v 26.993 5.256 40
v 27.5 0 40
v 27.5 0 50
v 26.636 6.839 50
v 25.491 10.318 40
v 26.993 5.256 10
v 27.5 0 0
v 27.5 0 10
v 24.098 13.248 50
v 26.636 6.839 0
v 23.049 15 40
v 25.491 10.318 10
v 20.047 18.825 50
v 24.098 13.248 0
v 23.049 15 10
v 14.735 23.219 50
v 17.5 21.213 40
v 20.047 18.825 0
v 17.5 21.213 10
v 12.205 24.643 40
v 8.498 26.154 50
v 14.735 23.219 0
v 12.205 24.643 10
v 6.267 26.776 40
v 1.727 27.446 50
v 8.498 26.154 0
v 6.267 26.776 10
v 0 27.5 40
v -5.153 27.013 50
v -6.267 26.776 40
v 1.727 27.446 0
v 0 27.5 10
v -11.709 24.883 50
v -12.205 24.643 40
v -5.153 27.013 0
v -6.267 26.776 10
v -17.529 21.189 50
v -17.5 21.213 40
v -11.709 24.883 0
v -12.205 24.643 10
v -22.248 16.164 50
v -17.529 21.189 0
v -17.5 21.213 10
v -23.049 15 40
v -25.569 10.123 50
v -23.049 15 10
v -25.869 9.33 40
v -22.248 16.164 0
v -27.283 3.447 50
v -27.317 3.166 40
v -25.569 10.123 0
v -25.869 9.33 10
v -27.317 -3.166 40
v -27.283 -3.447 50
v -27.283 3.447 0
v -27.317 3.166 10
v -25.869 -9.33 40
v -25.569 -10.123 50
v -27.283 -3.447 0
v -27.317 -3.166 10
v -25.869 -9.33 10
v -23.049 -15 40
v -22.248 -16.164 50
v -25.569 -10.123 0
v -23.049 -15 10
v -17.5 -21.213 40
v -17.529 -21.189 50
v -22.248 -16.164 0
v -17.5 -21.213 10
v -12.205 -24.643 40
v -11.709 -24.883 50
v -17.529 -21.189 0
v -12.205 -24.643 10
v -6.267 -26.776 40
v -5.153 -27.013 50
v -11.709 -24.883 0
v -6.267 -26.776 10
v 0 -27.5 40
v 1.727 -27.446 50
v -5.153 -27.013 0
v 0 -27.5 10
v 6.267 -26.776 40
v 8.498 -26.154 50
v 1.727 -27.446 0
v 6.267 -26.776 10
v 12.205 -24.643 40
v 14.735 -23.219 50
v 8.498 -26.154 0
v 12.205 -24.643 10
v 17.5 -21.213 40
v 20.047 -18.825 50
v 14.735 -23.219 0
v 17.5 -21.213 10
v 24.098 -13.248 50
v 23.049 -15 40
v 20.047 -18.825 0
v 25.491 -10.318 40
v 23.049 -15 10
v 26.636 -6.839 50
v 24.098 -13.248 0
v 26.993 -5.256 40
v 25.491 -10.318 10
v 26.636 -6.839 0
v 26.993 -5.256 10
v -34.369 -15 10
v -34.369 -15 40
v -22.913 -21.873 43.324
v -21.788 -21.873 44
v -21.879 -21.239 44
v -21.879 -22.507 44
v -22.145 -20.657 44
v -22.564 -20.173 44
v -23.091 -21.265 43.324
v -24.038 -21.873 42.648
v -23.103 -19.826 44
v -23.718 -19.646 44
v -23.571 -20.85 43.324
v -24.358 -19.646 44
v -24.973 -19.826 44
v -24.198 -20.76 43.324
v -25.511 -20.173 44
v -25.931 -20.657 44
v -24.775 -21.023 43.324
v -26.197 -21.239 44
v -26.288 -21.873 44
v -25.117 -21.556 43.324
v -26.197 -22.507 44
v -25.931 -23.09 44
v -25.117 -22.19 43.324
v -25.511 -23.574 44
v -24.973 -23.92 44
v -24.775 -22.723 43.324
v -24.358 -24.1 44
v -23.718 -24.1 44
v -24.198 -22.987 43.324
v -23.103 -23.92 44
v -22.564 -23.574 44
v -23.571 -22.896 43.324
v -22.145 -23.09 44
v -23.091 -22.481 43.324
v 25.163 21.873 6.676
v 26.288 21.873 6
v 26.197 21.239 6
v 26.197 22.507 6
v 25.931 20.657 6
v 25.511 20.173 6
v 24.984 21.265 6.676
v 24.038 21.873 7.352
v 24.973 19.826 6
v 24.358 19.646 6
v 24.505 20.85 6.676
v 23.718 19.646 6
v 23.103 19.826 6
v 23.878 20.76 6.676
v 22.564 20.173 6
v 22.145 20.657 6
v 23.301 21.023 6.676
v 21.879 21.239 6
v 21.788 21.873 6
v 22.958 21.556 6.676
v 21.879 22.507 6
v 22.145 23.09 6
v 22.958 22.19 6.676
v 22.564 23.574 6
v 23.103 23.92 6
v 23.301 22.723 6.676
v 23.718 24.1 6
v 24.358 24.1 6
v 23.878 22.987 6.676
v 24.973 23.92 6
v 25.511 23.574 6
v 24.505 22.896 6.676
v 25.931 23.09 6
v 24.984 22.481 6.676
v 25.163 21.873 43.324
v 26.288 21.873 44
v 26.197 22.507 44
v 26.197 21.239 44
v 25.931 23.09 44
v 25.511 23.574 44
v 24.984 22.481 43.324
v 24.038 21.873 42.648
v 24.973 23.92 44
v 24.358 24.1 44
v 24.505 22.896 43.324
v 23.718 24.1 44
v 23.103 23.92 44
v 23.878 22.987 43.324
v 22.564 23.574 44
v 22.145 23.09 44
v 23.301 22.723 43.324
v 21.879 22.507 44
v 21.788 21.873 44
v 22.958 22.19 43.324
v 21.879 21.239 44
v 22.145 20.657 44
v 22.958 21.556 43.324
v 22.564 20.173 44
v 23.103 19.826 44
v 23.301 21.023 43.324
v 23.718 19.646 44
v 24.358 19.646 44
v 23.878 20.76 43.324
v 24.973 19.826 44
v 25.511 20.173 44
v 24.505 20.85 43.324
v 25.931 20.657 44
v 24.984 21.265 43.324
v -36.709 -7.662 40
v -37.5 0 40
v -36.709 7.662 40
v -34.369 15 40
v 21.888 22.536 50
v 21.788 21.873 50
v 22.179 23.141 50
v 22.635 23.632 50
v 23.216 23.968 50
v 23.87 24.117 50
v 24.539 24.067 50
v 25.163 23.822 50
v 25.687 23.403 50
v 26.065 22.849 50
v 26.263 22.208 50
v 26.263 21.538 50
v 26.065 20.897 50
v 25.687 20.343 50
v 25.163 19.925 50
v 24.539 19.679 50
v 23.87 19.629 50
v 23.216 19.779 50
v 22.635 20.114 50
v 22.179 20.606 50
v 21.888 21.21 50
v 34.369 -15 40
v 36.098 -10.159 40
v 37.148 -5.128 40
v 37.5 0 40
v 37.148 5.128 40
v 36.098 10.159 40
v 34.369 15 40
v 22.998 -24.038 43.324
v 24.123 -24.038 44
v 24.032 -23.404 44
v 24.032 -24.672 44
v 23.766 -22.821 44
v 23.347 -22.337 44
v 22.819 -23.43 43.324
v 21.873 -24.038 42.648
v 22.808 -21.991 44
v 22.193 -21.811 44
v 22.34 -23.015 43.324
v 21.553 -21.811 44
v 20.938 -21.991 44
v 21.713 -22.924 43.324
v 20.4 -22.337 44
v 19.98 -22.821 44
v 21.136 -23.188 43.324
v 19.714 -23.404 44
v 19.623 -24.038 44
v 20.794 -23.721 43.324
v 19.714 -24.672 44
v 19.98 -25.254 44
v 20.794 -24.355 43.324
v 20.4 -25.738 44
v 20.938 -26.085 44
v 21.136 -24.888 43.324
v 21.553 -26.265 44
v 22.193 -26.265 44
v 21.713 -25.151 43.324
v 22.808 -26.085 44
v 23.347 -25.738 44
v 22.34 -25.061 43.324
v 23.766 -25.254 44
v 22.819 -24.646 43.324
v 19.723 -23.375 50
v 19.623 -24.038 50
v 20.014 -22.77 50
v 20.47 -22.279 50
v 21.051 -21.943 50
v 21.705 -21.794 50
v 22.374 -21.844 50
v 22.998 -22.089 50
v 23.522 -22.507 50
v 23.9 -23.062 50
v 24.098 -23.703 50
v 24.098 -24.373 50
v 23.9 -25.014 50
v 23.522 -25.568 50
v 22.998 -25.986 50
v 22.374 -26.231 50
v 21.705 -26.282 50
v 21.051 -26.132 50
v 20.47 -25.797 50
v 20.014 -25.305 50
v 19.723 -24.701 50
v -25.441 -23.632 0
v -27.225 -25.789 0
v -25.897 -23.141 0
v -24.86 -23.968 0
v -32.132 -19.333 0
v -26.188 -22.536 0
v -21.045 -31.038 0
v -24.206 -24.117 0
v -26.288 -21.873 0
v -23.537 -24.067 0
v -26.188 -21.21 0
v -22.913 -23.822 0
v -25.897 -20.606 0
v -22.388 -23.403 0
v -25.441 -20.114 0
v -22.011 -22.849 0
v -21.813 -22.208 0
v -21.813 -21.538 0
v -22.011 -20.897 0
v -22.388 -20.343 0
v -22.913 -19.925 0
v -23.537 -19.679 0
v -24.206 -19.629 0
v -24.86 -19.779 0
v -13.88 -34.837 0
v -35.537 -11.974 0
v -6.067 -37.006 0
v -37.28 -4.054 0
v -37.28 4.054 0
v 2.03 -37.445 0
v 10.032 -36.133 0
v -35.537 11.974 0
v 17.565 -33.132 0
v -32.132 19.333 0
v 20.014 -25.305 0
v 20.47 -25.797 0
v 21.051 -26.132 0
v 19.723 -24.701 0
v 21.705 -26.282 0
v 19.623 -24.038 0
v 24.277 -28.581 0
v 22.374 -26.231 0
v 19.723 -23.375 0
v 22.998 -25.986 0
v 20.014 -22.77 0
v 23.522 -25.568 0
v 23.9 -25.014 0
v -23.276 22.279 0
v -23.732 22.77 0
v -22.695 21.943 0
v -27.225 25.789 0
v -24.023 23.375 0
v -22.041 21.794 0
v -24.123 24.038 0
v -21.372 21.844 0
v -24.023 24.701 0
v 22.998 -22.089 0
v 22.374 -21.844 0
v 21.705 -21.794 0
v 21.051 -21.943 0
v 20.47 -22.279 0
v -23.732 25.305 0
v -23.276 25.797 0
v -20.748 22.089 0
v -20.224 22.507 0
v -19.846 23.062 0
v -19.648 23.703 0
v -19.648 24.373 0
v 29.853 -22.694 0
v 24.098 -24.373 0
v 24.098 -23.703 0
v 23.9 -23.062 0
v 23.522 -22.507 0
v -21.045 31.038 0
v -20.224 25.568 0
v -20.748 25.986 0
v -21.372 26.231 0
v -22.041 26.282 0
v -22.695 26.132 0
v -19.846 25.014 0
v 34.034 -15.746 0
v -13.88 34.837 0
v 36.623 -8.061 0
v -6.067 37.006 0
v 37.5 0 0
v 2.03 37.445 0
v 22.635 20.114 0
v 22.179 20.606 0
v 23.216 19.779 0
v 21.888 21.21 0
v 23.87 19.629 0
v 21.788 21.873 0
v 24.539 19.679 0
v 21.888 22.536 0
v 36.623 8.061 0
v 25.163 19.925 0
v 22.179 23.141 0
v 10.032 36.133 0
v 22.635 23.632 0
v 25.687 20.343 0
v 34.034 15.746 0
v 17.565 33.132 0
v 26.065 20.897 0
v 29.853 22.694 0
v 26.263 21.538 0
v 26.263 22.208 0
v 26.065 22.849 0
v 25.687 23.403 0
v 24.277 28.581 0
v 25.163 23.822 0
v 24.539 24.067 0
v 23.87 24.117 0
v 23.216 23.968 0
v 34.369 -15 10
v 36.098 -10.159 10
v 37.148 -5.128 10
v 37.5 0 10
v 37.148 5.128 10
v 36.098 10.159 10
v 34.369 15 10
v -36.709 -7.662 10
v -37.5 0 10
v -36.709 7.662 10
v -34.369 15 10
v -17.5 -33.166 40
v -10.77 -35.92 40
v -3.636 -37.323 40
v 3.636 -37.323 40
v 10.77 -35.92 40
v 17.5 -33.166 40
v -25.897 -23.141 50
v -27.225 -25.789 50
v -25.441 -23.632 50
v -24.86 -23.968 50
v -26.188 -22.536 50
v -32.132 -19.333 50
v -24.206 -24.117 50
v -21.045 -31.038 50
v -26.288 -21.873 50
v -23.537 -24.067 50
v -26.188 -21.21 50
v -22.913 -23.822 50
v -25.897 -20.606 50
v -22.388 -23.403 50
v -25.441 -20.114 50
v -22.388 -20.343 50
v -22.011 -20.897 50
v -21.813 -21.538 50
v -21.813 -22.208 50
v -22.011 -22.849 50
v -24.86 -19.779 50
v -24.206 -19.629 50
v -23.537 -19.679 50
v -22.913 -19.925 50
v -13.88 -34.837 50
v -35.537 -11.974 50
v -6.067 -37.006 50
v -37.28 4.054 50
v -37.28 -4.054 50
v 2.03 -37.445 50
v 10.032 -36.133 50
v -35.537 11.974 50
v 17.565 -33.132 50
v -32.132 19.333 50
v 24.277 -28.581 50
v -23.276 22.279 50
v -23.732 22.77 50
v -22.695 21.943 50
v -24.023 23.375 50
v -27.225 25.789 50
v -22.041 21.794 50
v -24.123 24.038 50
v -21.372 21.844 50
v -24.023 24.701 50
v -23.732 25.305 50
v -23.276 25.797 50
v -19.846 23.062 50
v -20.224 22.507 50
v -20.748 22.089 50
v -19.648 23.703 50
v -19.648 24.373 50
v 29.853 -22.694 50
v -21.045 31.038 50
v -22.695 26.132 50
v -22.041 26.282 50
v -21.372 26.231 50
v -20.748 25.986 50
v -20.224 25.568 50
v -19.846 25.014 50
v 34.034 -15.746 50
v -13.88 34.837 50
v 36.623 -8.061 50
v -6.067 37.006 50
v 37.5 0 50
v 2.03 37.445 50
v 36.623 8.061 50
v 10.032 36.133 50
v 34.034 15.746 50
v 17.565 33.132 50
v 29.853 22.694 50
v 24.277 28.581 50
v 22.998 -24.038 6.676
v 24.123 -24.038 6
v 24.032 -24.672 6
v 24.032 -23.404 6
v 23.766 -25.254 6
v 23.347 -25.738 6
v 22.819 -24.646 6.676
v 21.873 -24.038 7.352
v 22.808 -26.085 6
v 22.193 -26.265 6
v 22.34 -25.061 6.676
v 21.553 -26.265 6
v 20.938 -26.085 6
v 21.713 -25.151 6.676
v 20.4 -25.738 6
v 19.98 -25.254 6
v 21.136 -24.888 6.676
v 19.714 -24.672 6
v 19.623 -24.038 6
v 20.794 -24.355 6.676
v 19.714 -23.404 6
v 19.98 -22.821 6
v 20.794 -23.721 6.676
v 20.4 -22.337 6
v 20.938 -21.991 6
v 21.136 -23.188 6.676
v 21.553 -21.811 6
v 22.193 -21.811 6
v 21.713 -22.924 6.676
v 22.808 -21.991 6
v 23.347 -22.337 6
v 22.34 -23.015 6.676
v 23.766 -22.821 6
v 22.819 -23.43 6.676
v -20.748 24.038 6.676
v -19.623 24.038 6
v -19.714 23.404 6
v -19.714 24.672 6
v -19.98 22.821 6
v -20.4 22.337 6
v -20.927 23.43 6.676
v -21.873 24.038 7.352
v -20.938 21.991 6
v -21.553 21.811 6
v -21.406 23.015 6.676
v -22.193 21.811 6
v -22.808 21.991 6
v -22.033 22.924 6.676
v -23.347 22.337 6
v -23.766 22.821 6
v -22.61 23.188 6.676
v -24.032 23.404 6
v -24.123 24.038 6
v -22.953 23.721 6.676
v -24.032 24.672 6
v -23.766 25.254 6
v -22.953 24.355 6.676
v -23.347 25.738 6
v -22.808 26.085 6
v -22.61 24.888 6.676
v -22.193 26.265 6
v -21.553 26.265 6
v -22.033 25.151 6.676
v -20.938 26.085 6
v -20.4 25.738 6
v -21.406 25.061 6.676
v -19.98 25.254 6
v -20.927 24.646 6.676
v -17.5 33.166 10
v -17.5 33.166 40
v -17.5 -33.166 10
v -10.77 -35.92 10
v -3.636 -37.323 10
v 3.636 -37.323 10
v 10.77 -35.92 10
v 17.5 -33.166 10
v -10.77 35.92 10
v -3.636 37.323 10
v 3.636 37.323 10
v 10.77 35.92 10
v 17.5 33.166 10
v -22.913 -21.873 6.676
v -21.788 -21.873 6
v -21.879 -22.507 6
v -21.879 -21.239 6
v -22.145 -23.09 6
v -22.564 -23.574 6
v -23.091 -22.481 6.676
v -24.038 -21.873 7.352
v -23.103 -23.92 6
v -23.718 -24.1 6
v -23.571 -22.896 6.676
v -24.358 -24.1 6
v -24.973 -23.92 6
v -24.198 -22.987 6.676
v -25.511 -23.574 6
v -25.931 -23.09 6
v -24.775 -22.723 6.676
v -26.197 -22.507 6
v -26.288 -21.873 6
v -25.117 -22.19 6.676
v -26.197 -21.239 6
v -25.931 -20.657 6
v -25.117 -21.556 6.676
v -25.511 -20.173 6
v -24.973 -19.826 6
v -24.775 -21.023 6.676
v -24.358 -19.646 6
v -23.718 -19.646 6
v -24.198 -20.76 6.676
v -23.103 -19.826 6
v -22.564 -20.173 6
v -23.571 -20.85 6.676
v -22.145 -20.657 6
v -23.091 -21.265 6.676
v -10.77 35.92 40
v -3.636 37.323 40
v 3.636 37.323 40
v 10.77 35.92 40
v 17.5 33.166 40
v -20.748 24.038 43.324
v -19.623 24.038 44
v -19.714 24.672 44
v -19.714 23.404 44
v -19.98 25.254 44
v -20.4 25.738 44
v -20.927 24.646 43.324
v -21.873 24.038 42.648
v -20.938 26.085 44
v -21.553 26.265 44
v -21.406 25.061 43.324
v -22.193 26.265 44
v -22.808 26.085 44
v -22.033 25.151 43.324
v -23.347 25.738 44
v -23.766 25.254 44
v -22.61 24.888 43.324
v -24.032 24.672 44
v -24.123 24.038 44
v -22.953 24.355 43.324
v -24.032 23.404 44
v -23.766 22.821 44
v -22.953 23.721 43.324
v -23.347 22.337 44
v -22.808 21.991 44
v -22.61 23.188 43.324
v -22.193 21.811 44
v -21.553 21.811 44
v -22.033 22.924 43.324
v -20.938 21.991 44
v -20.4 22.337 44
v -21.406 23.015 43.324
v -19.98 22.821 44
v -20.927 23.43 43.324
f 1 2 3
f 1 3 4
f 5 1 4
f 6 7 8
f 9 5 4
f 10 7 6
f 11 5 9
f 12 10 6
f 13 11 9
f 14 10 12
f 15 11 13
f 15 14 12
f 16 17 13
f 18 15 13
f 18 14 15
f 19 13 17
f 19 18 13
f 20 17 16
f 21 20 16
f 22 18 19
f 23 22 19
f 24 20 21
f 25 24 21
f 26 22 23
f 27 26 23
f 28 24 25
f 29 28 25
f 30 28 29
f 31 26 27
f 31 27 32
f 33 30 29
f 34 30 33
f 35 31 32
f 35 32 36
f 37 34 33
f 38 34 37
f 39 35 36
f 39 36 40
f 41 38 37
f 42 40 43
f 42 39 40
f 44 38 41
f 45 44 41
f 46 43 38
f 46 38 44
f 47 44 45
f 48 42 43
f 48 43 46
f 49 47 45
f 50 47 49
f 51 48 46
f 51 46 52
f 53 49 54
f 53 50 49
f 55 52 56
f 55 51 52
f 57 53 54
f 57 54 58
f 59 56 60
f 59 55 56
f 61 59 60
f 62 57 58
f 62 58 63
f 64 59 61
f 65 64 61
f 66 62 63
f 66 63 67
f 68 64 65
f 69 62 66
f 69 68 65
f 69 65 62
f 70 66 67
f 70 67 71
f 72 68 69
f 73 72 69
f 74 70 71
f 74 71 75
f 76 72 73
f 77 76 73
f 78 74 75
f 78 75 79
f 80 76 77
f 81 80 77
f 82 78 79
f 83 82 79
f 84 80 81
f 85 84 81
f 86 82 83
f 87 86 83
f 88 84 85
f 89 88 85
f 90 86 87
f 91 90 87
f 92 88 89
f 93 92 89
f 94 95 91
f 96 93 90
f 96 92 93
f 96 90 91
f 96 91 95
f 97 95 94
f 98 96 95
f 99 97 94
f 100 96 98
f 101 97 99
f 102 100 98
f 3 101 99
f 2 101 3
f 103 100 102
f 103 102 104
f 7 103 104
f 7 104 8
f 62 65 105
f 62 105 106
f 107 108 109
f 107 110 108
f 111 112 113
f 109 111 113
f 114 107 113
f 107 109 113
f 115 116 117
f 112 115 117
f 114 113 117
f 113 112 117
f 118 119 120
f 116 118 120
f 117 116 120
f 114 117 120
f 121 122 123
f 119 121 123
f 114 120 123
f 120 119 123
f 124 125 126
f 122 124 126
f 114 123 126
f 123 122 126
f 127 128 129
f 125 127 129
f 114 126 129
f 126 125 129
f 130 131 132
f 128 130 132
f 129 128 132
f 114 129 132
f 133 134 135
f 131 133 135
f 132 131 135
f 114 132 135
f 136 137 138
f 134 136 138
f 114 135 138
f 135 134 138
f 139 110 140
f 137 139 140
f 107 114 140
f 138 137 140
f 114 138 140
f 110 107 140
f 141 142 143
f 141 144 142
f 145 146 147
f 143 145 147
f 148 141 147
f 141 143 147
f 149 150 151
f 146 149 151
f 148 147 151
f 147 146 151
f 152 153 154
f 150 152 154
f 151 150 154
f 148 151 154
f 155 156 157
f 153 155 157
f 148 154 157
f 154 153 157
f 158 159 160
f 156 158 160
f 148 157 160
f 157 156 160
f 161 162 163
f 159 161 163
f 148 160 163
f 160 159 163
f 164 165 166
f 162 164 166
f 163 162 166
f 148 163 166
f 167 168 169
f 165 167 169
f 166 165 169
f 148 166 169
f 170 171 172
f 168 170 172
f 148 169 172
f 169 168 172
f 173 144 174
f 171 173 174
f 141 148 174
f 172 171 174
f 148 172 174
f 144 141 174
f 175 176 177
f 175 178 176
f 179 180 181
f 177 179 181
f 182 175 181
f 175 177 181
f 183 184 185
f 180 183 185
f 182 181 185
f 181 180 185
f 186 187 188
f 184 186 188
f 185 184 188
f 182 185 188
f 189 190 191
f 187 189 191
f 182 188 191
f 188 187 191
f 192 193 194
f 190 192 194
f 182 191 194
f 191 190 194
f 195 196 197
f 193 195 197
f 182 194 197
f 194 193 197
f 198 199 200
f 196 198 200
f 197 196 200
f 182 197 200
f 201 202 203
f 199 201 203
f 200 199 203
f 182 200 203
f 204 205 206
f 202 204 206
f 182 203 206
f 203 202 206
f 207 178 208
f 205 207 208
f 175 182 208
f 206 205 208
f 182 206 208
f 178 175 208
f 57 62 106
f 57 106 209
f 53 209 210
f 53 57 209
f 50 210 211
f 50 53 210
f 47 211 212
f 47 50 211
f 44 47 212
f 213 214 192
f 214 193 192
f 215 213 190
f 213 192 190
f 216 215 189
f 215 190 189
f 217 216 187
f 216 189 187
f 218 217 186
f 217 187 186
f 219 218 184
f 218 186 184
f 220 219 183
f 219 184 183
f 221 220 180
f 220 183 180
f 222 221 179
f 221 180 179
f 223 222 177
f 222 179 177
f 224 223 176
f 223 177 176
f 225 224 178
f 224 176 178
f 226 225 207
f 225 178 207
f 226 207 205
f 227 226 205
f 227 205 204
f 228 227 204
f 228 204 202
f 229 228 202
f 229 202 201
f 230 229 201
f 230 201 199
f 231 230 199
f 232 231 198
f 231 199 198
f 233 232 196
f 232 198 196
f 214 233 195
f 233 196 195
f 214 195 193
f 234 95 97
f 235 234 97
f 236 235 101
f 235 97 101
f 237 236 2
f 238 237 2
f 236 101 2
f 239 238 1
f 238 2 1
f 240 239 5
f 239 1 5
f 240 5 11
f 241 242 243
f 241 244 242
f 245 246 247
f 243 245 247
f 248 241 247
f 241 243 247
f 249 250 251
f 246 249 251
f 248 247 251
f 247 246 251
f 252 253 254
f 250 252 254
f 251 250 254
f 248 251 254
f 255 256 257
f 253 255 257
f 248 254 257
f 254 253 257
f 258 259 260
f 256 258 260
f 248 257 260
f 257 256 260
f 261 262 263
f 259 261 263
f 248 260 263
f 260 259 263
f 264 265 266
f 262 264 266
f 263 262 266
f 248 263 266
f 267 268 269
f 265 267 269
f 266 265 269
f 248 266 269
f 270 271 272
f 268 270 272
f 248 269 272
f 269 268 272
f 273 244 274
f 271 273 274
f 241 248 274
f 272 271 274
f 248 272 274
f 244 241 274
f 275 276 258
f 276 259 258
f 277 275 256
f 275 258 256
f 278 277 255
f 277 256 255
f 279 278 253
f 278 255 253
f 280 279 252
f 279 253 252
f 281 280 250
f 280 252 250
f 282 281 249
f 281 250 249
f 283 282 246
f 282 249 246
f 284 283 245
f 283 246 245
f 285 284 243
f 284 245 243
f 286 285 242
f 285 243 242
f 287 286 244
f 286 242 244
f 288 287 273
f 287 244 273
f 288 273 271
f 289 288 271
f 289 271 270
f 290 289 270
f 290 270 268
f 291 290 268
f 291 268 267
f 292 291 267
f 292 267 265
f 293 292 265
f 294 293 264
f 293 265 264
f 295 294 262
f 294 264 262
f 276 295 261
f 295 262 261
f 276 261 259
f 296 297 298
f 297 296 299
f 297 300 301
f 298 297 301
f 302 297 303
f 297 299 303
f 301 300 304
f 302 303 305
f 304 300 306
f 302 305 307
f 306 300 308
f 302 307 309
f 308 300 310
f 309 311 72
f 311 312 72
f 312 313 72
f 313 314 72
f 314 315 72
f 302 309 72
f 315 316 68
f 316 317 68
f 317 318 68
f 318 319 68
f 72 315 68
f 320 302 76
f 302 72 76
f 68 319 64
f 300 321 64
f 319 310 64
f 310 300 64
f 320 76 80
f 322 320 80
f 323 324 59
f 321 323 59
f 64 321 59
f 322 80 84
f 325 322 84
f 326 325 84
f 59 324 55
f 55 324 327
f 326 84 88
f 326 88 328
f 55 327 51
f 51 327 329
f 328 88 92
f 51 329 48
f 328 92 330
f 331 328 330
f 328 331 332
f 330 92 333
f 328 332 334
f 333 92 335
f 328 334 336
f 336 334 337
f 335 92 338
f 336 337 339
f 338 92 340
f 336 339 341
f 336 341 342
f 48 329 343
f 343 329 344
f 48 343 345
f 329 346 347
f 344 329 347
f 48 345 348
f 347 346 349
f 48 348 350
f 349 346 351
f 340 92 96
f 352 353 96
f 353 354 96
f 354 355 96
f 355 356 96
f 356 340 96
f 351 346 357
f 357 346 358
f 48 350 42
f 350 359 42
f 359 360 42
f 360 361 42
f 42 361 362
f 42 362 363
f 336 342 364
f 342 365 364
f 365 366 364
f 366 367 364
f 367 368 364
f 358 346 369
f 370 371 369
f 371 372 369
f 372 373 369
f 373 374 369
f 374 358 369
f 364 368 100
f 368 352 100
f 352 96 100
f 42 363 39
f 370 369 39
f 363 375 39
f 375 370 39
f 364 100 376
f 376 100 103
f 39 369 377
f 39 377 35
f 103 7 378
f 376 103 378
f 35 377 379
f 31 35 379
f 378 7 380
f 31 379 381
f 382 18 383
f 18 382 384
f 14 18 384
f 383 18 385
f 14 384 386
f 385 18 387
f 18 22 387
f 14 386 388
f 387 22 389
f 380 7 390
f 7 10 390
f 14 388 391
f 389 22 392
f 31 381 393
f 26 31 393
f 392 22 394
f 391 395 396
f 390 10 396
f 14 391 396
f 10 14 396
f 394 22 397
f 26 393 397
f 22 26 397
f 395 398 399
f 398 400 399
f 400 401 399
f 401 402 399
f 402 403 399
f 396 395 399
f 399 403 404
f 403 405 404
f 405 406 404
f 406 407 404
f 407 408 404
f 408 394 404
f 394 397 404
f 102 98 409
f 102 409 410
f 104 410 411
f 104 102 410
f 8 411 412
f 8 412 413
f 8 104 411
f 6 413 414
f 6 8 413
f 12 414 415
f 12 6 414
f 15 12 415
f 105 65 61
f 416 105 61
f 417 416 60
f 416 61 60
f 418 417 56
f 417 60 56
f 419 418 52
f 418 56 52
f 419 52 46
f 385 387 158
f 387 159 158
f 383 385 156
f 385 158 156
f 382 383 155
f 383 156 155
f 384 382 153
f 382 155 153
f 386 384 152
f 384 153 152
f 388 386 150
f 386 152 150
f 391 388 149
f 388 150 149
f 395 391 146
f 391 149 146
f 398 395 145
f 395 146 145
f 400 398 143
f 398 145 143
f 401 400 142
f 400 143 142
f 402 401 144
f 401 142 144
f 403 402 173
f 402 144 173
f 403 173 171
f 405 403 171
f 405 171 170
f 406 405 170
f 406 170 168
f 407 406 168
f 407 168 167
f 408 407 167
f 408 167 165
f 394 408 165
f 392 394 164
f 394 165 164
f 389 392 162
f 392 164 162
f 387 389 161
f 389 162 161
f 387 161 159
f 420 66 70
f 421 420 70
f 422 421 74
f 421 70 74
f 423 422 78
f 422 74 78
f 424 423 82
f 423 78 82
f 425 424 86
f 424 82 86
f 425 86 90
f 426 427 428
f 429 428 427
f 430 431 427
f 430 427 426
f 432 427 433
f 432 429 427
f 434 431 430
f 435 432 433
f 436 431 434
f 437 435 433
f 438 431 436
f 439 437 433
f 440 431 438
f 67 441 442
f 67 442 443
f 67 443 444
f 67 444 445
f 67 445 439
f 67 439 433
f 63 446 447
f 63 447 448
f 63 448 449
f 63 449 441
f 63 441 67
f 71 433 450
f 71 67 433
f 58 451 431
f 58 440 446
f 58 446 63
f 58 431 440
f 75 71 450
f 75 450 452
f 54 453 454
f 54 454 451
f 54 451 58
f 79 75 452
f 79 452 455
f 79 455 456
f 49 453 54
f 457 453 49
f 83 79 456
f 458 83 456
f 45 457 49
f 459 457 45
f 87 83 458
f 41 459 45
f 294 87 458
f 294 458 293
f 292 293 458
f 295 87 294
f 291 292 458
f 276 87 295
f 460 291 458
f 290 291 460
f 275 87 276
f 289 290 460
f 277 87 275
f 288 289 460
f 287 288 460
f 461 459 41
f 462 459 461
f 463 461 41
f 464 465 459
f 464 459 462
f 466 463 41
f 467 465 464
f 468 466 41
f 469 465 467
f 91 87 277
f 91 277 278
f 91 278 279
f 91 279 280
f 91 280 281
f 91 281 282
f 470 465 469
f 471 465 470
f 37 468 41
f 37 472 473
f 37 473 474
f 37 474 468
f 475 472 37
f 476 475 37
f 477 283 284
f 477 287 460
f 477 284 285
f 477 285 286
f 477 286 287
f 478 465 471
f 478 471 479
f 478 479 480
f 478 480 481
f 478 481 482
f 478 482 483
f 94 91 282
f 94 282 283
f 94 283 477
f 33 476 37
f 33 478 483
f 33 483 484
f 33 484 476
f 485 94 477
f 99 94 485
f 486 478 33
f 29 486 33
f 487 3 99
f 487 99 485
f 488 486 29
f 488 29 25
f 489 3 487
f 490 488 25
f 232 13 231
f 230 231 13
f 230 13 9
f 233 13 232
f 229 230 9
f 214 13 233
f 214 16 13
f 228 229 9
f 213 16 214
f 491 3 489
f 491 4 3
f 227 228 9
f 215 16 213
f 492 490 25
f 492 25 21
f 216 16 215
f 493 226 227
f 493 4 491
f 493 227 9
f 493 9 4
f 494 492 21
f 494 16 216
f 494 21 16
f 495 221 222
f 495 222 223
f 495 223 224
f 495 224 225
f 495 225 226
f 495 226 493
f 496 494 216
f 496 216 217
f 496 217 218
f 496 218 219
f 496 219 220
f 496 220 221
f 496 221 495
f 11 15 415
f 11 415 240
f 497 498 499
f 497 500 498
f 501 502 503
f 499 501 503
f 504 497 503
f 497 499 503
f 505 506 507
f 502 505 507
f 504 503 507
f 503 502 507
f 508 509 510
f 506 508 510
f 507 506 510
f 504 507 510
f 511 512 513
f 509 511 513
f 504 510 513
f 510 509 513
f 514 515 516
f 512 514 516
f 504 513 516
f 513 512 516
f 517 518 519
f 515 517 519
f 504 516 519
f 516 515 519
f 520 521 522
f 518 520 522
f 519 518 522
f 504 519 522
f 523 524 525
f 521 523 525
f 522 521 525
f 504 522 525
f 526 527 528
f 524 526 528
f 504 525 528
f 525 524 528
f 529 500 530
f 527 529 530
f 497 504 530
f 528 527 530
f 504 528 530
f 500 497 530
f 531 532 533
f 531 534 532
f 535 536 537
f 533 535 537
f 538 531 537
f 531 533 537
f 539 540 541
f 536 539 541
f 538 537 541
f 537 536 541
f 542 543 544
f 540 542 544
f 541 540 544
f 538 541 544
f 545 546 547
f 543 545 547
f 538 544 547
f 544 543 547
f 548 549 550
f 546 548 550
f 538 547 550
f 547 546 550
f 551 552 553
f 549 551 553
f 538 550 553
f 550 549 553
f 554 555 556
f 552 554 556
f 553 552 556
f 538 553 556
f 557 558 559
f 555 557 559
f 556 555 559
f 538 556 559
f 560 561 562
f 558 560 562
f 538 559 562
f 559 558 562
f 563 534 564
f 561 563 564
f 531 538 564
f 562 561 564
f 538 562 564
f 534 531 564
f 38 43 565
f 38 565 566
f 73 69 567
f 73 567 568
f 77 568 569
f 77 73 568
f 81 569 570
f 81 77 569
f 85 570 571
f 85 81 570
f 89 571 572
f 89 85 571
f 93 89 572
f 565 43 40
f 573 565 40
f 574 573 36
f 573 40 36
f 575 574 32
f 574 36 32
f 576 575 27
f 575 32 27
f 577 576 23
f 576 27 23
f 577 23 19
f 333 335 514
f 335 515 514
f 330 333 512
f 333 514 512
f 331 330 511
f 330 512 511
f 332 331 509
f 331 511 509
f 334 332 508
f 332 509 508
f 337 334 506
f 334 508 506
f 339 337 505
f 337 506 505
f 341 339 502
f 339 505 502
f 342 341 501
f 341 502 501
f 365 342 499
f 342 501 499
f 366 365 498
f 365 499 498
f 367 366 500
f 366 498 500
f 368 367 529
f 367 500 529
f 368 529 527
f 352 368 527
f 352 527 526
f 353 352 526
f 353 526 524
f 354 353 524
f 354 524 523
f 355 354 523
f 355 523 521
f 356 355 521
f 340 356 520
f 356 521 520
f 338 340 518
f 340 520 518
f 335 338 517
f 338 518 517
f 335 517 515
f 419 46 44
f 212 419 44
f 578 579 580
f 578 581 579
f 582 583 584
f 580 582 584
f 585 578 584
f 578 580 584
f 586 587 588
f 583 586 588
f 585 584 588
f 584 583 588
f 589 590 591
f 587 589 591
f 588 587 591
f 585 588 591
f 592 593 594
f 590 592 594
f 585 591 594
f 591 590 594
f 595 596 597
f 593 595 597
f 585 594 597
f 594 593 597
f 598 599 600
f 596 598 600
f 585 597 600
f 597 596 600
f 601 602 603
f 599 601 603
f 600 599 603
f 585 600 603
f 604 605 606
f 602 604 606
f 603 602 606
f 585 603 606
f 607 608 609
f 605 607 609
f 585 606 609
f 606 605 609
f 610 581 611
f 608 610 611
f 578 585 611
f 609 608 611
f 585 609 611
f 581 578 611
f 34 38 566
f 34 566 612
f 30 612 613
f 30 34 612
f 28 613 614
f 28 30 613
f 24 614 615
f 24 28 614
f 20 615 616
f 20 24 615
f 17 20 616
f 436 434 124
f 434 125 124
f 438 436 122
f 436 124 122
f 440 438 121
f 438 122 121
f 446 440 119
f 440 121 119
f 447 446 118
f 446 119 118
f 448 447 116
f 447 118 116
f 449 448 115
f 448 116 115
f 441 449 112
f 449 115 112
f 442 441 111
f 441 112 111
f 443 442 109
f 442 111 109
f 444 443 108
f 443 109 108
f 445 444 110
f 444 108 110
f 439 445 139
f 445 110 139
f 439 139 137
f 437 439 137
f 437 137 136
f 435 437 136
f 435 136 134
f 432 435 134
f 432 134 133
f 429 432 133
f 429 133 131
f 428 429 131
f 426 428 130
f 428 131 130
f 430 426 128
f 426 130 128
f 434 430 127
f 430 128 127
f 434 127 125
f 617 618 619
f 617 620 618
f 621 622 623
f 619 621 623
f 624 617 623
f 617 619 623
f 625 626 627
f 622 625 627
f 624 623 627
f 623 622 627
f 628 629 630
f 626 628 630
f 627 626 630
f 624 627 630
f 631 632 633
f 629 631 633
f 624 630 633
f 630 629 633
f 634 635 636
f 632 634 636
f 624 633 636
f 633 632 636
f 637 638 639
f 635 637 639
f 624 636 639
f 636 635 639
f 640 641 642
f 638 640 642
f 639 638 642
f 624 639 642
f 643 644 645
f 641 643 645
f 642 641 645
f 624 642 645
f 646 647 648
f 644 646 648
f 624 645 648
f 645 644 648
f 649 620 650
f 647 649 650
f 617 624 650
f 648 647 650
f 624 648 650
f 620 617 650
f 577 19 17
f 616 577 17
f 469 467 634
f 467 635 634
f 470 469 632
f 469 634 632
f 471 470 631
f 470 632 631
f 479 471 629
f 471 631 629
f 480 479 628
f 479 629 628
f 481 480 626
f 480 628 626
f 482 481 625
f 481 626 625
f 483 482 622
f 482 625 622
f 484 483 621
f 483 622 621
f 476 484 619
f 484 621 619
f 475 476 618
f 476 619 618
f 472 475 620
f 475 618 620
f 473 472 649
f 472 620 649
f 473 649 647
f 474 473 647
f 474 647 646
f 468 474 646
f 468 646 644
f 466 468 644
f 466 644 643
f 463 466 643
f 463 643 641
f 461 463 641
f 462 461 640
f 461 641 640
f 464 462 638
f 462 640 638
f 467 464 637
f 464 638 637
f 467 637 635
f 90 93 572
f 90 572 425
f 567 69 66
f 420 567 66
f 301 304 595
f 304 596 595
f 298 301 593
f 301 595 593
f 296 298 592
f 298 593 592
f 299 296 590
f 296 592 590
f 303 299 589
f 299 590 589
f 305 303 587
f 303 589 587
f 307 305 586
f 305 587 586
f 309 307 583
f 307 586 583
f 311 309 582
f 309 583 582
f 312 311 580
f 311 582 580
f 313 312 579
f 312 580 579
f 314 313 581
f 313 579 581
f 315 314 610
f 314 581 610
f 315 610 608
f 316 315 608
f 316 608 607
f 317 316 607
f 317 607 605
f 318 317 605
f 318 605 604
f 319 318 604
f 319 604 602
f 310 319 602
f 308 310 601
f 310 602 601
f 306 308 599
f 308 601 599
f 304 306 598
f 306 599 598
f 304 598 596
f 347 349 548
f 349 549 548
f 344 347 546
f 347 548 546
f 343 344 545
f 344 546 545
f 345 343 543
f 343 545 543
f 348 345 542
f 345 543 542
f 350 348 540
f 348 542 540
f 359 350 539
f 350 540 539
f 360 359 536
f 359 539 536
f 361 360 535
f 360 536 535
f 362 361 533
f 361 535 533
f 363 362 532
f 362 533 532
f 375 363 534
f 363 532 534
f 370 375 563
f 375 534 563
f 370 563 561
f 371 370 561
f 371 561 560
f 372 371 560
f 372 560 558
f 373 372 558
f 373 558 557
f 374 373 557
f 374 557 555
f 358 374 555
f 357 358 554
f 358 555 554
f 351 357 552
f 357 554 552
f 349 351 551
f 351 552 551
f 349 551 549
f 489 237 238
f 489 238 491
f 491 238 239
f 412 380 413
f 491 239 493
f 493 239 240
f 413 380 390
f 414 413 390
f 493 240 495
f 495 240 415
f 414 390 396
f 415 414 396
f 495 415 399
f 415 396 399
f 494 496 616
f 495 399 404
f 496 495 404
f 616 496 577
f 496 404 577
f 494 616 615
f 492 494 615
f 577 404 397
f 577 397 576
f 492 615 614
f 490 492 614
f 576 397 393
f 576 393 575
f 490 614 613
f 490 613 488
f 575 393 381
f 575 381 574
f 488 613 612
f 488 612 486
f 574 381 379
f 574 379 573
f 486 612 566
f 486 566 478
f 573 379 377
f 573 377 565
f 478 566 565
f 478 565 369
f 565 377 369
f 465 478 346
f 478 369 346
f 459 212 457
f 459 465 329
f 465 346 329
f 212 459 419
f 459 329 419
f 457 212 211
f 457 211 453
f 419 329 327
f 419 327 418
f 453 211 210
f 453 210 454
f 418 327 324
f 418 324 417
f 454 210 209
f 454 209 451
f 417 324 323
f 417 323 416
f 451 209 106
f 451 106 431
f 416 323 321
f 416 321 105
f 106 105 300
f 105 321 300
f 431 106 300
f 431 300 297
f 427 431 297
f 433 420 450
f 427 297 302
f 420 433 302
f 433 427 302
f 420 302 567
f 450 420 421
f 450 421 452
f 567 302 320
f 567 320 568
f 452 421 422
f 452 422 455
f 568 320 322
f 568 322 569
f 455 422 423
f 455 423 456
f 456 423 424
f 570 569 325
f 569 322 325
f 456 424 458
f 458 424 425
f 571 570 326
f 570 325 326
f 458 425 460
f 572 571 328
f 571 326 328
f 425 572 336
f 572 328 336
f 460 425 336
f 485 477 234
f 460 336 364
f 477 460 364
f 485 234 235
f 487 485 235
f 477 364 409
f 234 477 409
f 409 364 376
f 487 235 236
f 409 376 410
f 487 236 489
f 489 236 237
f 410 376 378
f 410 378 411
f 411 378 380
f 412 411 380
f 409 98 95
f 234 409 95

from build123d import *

# Parameters (mm, degrees)
F0_R          = 37.5
F0_R_2        = 27.5
F2_DEPTH      = 50
F3_W          = 35
F3_H          = 30
F4_DEPTH      = 37.501
F4_DEPTH_BACK = 37.501
F5_W          = 30
F5_H          = 30
F6_DEPTH      = 37.501
F6_DEPTH_BACK = 37.501
F8_D          = 4.5
F8_DEPTH      = 6
F8_TIP        = 1.3519363928
F10_D         = 4.5
F10_DEPTH     = 6
F10_TIP       = 1.3519363928


with BuildPart() as f2:
    # F0 (on Top) → F2 (new body)
    with BuildSketch(Plane.XY):
        Circle(F0_R)
        Circle(F0_R_2, mode=Mode.SUBTRACT)
    extrude(amount=F2_DEPTH)

    # F3 (on Front) → F4 (cut, two sides)
    with BuildSketch(Plane.XZ) as f4_sk:
        with Locations((0, 25)):
            Rectangle(F3_W, F3_H)
    extrude(amount=-F4_DEPTH, mode=Mode.SUBTRACT)
    extrude(f4_sk.sketch, amount=F4_DEPTH_BACK, mode=Mode.SUBTRACT)

    # F5 (on Right) → F6 (cut, two sides)
    with BuildSketch(Plane.YZ) as f6_sk:
        with Locations((0, 25)):
            Rectangle(F5_W, F5_H)
    extrude(amount=-F6_DEPTH, mode=Mode.SUBTRACT)
    extrude(f6_sk.sketch, amount=F6_DEPTH_BACK, mode=Mode.SUBTRACT)

    # F8
    with Locations(Plane.XY.offset(50)):
        with Locations((21.8730719462, -24.0378602133), (24.0378602133, 21.8730719462), (-21.8730719462, 24.0378602133), (-24.0378602133, -21.8730719462)):
            Hole(F8_D / 2, depth=F8_DEPTH)
            with Locations((0, 0, -(F8_DEPTH + F8_TIP / 2))):  # 118° drill point
                Cone(0, F8_D / 2, F8_TIP, mode=Mode.SUBTRACT)

    # F10
    with Locations(Plane(origin=(0, 0, 0), x_dir=(1, 0, 0), z_dir=(0, 0, -1))):
        with Locations((21.8730719462, 24.0378602133), (24.0378602133, -21.8730719462), (-24.0378602133, 21.8730719462), (-21.8730719462, -24.0378602133)):
            Hole(F10_D / 2, depth=F10_DEPTH)
            with Locations((0, 0, -(F10_DEPTH + F10_TIP / 2))):  # 118° drill point
                Cone(0, F10_D / 2, F10_TIP, mode=Mode.SUBTRACT)


solid = f2.part
